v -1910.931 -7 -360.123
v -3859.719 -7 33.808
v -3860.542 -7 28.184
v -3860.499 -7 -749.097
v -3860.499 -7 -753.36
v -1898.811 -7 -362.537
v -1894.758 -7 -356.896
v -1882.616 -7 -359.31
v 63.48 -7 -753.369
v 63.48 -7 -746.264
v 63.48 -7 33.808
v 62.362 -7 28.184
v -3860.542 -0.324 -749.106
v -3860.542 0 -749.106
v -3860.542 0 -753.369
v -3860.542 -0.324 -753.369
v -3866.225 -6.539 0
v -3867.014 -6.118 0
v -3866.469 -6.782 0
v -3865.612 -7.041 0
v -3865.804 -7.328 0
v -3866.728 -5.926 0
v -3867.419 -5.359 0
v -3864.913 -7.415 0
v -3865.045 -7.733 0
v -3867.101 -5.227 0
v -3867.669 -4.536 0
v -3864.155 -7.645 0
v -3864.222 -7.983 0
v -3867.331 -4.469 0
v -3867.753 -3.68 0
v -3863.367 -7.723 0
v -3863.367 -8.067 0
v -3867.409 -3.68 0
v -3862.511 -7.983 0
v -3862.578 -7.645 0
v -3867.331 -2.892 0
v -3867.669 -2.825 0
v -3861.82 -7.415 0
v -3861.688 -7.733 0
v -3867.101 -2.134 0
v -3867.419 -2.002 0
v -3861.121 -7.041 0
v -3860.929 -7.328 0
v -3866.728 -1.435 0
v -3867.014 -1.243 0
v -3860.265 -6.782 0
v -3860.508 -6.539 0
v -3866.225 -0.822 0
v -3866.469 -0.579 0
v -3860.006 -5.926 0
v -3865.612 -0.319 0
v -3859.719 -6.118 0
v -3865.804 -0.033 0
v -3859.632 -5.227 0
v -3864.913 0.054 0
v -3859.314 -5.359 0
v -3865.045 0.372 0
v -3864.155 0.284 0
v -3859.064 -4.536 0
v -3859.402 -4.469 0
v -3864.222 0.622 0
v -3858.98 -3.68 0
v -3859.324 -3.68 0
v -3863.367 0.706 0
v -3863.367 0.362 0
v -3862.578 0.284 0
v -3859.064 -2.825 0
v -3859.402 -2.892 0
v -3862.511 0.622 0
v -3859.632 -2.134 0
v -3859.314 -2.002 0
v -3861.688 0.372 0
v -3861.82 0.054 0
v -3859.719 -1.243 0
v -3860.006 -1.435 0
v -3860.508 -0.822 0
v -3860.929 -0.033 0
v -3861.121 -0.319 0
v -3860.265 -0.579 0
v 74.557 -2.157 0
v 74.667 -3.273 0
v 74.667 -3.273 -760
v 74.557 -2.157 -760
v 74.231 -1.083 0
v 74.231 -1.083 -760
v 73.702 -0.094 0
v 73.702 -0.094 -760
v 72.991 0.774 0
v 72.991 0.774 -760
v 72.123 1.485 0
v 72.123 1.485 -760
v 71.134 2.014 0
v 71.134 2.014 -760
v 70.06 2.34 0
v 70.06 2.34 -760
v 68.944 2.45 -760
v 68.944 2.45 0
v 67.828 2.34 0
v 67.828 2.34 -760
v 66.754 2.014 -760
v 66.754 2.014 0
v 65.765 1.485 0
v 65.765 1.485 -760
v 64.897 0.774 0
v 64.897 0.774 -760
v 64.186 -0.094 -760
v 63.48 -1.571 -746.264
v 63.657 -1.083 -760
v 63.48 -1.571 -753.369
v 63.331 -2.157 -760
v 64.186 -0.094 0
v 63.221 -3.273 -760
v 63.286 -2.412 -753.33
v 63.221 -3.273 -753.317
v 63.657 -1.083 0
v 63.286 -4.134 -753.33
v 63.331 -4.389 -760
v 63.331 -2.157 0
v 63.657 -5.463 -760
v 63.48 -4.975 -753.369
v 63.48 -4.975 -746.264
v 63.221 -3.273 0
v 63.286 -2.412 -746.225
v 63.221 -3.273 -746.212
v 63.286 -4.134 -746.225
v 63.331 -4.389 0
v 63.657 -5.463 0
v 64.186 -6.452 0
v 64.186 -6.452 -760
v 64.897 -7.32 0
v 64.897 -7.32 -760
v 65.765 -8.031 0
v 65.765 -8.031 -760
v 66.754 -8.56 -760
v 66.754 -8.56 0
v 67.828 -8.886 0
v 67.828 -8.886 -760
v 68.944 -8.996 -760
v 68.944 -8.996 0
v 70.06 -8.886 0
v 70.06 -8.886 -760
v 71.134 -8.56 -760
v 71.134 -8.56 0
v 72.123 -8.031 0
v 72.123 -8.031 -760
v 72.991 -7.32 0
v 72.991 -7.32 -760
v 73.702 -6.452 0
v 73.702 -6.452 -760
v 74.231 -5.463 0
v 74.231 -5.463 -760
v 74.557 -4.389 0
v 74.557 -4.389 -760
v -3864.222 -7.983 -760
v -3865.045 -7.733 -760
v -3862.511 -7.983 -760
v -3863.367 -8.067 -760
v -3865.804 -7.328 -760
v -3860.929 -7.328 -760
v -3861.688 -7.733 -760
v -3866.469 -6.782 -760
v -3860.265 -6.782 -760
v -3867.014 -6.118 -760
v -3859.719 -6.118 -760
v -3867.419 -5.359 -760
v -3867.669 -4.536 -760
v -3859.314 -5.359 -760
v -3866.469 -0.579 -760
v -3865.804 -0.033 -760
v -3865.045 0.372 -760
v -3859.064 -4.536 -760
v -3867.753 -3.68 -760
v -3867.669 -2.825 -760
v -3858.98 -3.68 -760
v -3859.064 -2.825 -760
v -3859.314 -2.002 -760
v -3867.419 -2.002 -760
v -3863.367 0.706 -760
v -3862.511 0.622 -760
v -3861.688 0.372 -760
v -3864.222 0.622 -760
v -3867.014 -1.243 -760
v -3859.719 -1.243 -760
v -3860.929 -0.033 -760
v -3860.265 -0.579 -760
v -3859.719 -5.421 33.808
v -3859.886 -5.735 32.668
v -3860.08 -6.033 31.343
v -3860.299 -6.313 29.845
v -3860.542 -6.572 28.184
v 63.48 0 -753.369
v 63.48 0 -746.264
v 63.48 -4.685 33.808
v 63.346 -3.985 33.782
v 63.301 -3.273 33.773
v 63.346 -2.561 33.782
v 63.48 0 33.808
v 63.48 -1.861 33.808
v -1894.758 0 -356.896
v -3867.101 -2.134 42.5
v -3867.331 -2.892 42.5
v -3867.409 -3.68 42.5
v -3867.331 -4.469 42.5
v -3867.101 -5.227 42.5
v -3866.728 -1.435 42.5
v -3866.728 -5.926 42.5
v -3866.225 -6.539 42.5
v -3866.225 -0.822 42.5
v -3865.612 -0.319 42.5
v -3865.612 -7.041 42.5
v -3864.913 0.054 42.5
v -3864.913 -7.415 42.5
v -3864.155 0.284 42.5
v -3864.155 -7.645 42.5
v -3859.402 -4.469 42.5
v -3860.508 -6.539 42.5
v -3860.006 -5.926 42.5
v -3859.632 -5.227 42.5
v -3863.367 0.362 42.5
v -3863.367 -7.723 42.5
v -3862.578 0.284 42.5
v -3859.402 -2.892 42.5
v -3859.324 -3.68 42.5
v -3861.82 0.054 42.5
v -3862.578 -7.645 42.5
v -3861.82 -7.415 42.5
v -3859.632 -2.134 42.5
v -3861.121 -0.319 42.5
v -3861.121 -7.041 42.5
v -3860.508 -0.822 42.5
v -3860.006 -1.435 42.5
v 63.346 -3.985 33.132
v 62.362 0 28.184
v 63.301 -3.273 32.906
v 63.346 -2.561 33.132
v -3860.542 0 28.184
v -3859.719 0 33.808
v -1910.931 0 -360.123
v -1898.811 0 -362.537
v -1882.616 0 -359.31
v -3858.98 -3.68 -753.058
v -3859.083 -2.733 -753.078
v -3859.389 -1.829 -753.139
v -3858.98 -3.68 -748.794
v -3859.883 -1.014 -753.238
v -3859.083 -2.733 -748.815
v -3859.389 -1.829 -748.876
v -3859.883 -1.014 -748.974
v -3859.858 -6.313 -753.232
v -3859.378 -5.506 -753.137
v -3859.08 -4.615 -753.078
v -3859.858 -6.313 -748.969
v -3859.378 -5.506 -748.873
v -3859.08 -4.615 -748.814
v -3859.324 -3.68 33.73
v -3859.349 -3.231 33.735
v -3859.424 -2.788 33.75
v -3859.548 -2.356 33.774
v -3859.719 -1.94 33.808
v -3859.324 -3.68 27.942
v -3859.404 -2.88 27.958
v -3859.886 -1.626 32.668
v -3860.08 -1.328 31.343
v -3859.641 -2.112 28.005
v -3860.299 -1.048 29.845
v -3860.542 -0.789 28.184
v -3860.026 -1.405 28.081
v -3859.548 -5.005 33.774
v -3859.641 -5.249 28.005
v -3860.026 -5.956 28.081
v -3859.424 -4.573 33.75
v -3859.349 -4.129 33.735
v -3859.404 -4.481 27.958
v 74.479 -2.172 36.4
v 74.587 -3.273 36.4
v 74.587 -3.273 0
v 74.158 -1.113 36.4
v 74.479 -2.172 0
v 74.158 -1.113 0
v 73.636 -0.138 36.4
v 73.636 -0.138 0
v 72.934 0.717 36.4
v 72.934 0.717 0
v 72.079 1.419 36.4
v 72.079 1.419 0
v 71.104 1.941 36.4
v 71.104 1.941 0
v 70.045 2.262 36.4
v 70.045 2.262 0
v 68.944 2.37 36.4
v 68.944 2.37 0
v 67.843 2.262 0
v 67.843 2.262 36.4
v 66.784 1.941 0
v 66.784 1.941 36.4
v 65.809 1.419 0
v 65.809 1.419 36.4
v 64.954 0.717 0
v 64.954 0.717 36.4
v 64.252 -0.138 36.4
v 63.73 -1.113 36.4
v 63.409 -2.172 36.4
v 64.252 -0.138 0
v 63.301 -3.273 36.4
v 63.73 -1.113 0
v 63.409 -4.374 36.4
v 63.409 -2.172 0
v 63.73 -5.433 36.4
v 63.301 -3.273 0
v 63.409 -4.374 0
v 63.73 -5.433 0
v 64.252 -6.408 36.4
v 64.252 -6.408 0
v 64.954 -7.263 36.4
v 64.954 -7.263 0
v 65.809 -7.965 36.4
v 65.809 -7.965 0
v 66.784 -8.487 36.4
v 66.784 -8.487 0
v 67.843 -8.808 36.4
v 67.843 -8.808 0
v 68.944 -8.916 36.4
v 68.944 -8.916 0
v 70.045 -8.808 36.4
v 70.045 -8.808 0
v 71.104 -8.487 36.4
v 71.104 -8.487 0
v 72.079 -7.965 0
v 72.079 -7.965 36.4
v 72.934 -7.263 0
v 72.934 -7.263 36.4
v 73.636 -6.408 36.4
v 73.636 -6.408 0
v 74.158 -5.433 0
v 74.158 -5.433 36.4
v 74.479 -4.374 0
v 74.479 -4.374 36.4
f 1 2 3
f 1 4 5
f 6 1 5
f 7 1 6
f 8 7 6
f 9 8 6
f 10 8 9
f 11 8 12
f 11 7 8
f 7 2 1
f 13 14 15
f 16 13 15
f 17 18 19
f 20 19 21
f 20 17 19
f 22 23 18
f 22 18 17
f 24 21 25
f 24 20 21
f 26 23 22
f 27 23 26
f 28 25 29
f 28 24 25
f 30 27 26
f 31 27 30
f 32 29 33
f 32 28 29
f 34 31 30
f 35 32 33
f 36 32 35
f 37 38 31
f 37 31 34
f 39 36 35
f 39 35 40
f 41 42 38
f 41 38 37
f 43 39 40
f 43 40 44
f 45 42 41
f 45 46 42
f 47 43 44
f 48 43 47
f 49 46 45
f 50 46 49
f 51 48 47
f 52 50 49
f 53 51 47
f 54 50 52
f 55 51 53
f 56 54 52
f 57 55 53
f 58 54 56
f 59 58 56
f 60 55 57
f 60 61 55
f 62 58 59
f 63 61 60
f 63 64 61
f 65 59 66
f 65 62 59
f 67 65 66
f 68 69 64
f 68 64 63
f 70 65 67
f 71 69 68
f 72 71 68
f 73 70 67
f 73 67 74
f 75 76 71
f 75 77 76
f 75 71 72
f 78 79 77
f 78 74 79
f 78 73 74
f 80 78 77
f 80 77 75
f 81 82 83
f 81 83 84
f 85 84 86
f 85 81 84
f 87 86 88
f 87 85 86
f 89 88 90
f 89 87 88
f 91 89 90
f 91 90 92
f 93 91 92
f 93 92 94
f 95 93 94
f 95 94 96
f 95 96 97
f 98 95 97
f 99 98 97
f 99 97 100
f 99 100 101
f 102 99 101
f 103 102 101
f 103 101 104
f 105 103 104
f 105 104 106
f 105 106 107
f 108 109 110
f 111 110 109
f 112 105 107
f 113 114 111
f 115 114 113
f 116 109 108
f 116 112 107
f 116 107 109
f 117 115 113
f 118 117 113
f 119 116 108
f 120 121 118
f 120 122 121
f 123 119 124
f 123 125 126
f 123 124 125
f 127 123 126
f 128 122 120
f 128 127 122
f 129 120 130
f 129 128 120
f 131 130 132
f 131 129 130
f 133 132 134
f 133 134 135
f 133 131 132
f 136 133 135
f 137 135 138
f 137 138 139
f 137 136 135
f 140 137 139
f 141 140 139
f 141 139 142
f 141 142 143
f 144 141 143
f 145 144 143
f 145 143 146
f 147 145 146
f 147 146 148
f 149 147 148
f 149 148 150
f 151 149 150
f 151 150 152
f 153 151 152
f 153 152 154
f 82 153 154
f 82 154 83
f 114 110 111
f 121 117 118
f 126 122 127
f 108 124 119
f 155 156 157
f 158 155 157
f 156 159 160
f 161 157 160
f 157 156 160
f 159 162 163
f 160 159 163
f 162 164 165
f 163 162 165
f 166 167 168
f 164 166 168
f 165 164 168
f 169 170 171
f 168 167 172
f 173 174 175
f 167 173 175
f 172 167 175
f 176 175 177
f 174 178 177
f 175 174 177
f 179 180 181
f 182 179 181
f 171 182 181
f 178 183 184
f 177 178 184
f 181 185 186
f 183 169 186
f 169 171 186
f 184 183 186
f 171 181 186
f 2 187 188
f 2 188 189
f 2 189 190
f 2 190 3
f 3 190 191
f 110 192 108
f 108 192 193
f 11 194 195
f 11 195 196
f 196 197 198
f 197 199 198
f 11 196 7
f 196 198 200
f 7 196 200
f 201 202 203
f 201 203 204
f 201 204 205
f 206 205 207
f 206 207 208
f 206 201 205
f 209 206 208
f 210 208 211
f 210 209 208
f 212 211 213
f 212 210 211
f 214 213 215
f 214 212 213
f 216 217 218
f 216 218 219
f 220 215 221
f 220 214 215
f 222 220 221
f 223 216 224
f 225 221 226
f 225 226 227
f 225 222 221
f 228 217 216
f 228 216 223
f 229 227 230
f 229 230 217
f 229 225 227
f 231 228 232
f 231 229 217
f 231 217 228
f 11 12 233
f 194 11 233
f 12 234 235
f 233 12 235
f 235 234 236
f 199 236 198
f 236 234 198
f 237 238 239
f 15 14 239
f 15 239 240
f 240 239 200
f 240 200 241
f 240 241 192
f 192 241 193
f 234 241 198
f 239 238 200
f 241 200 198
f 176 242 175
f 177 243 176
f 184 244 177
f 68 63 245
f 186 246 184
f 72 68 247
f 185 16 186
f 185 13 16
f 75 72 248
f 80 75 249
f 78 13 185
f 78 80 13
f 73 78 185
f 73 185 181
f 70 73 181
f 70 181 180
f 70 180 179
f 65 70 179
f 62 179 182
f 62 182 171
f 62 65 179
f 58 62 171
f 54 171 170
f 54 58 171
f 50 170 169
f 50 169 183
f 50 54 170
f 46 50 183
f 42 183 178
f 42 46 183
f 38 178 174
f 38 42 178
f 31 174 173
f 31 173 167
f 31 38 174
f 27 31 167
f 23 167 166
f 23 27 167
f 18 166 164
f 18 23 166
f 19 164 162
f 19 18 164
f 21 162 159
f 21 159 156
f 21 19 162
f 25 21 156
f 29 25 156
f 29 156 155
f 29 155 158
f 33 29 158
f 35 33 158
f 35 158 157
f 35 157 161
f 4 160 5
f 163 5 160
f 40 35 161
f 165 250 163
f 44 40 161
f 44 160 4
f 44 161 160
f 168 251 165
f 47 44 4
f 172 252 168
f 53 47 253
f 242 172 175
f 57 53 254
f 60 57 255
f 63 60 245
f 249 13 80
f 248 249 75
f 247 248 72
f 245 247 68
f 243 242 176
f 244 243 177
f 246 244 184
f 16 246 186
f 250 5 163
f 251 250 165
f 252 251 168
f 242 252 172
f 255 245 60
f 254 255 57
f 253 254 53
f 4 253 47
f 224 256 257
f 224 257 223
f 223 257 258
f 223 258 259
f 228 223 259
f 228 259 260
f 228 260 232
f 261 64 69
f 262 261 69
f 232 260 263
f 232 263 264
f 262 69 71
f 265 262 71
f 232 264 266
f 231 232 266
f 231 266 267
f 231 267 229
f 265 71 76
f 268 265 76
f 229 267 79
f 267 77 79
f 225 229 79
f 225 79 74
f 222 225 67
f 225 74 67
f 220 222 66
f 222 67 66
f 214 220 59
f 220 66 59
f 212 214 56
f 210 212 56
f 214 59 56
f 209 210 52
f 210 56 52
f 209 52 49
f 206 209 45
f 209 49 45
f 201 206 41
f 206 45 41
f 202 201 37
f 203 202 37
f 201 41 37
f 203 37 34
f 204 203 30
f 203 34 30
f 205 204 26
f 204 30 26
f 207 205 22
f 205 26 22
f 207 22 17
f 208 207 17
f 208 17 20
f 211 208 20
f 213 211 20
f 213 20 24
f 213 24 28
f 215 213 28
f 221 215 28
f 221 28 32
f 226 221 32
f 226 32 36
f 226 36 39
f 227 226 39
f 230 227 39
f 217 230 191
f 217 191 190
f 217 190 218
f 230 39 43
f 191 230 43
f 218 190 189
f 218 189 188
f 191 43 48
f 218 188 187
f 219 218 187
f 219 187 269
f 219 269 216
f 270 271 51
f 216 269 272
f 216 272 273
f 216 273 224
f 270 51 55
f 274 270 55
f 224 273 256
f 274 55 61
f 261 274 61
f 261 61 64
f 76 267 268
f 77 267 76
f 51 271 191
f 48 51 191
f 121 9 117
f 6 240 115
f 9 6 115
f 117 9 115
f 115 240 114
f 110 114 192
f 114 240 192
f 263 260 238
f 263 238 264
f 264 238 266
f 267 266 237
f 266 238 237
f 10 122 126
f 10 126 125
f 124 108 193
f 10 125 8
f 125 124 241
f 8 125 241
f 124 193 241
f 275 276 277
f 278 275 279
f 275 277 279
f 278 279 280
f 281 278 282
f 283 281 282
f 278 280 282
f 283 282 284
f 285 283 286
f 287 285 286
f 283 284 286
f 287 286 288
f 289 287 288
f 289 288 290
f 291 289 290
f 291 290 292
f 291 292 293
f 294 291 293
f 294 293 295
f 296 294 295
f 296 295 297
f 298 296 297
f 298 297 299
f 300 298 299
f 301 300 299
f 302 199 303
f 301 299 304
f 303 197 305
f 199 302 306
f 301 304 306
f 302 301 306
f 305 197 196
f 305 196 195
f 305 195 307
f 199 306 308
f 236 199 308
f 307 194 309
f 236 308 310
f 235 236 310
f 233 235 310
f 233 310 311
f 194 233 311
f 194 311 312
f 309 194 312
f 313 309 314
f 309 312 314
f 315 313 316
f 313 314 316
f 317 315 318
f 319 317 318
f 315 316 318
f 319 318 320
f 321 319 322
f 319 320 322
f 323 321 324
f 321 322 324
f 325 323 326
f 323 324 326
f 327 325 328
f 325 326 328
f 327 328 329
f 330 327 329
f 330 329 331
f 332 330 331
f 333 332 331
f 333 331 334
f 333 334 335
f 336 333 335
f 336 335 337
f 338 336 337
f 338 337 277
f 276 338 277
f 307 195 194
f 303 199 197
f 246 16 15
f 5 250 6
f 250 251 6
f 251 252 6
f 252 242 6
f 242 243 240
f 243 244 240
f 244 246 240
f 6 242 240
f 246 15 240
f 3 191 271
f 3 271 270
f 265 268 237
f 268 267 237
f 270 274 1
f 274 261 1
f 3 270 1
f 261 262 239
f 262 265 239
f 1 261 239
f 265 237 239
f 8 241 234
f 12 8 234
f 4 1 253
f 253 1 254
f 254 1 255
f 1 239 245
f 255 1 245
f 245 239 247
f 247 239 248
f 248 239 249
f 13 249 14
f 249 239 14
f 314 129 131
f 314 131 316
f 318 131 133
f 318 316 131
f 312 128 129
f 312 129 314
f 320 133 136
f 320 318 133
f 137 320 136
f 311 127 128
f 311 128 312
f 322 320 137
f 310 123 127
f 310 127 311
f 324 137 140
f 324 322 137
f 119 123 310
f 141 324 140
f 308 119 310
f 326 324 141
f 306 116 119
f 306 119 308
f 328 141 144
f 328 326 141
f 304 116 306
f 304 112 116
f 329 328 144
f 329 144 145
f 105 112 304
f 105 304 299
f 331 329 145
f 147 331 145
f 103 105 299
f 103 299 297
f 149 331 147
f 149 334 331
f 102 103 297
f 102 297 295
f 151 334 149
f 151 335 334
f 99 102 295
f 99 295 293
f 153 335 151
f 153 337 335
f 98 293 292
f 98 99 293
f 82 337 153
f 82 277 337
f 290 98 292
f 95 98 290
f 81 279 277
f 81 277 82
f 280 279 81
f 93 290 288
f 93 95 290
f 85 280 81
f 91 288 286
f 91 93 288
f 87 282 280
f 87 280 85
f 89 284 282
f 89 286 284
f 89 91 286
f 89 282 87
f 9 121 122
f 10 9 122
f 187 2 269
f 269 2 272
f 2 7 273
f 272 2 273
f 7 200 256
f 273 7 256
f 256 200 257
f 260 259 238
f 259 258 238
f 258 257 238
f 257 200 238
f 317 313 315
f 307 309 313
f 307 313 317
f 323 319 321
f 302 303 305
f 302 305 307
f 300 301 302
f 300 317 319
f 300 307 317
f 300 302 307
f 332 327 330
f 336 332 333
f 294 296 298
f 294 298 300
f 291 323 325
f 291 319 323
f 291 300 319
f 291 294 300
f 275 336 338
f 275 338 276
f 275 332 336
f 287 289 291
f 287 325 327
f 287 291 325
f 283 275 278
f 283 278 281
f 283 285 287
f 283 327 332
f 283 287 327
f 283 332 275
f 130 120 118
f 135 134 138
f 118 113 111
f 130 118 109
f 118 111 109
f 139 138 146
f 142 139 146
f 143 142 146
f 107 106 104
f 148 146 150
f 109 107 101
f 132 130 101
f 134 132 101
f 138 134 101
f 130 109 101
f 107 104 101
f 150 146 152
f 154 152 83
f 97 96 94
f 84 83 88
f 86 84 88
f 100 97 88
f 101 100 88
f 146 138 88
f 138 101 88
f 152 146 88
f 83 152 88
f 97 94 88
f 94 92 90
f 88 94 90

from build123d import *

# Parameters (mm, degrees)
F1_DEPTH = 7
F2_R     = 4.3868021934
F2_R_2   = 5.7227256207
F3_DEPTH = 760
F4_R     = 4.0422183717
F5_DEPTH = 42.5
F6_R     = 5.6433519697
F7_DEPTH = 36.4


with BuildPart() as f1:
    # F0 (on Front) → F1 (new body)
    with BuildSketch(Plane.XZ):
        Polygon((-1894.7580985835, -356.8958429289), (-3859.7185040638, 33.8084518174), (-3860.5420325733, 28.1842127442), (-1910.9308050802, -360.1225932403), align=None)
        Polygon((63.4801523903, 33.8084518174), (-1894.7580985835, -356.8958429289), (-1882.6158415256, -359.310157216), (62.3618528285, 28.1842127442), align=None)
        Polygon((-1882.6158415256, -359.310157216), (-1894.7580985835, -356.8958429289), (-1910.9308050802, -360.1225932403), (-1898.8105548254, -362.5366005038), align=None)
        Polygon((63.4801523903, -746.2635333201), (-1882.6158415256, -359.310157216), (-1898.8105548254, -362.5366005038), (63.4801523903, -753.3687962702), align=None)
        Polygon((-1898.8105548254, -362.5366005038), (-1910.9308050802, -360.1225932403), (-3860.5420325733, -749.1056392452), (-3860.5420325733, -753.3687962702), align=None)
    extrude(amount=F1_DEPTH)

    # F2 (on Top) → F3 (join)
    with BuildSketch(Plane.XY):
        with Locations((-3863.3666038513, -3.6804678384)):
            Circle(F2_R)
        with Locations((68.9439699054, -3.2730470411)):
            Circle(F2_R_2)
    extrude(amount=-F3_DEPTH)

    # F4 (on face) → F5 (join)
    with BuildSketch(Plane.XY):
        with Locations((-3863.3666038513, -3.6804678384)):
            Circle(F4_R)
    extrude(amount=F5_DEPTH)

    # F6 (on face) → F7 (join)
    with BuildSketch(Plane.XY):
        with Locations((68.9439699054, -3.2730470411)):
            Circle(F6_R)
    extrude(amount=F7_DEPTH)


solid = f1.part
